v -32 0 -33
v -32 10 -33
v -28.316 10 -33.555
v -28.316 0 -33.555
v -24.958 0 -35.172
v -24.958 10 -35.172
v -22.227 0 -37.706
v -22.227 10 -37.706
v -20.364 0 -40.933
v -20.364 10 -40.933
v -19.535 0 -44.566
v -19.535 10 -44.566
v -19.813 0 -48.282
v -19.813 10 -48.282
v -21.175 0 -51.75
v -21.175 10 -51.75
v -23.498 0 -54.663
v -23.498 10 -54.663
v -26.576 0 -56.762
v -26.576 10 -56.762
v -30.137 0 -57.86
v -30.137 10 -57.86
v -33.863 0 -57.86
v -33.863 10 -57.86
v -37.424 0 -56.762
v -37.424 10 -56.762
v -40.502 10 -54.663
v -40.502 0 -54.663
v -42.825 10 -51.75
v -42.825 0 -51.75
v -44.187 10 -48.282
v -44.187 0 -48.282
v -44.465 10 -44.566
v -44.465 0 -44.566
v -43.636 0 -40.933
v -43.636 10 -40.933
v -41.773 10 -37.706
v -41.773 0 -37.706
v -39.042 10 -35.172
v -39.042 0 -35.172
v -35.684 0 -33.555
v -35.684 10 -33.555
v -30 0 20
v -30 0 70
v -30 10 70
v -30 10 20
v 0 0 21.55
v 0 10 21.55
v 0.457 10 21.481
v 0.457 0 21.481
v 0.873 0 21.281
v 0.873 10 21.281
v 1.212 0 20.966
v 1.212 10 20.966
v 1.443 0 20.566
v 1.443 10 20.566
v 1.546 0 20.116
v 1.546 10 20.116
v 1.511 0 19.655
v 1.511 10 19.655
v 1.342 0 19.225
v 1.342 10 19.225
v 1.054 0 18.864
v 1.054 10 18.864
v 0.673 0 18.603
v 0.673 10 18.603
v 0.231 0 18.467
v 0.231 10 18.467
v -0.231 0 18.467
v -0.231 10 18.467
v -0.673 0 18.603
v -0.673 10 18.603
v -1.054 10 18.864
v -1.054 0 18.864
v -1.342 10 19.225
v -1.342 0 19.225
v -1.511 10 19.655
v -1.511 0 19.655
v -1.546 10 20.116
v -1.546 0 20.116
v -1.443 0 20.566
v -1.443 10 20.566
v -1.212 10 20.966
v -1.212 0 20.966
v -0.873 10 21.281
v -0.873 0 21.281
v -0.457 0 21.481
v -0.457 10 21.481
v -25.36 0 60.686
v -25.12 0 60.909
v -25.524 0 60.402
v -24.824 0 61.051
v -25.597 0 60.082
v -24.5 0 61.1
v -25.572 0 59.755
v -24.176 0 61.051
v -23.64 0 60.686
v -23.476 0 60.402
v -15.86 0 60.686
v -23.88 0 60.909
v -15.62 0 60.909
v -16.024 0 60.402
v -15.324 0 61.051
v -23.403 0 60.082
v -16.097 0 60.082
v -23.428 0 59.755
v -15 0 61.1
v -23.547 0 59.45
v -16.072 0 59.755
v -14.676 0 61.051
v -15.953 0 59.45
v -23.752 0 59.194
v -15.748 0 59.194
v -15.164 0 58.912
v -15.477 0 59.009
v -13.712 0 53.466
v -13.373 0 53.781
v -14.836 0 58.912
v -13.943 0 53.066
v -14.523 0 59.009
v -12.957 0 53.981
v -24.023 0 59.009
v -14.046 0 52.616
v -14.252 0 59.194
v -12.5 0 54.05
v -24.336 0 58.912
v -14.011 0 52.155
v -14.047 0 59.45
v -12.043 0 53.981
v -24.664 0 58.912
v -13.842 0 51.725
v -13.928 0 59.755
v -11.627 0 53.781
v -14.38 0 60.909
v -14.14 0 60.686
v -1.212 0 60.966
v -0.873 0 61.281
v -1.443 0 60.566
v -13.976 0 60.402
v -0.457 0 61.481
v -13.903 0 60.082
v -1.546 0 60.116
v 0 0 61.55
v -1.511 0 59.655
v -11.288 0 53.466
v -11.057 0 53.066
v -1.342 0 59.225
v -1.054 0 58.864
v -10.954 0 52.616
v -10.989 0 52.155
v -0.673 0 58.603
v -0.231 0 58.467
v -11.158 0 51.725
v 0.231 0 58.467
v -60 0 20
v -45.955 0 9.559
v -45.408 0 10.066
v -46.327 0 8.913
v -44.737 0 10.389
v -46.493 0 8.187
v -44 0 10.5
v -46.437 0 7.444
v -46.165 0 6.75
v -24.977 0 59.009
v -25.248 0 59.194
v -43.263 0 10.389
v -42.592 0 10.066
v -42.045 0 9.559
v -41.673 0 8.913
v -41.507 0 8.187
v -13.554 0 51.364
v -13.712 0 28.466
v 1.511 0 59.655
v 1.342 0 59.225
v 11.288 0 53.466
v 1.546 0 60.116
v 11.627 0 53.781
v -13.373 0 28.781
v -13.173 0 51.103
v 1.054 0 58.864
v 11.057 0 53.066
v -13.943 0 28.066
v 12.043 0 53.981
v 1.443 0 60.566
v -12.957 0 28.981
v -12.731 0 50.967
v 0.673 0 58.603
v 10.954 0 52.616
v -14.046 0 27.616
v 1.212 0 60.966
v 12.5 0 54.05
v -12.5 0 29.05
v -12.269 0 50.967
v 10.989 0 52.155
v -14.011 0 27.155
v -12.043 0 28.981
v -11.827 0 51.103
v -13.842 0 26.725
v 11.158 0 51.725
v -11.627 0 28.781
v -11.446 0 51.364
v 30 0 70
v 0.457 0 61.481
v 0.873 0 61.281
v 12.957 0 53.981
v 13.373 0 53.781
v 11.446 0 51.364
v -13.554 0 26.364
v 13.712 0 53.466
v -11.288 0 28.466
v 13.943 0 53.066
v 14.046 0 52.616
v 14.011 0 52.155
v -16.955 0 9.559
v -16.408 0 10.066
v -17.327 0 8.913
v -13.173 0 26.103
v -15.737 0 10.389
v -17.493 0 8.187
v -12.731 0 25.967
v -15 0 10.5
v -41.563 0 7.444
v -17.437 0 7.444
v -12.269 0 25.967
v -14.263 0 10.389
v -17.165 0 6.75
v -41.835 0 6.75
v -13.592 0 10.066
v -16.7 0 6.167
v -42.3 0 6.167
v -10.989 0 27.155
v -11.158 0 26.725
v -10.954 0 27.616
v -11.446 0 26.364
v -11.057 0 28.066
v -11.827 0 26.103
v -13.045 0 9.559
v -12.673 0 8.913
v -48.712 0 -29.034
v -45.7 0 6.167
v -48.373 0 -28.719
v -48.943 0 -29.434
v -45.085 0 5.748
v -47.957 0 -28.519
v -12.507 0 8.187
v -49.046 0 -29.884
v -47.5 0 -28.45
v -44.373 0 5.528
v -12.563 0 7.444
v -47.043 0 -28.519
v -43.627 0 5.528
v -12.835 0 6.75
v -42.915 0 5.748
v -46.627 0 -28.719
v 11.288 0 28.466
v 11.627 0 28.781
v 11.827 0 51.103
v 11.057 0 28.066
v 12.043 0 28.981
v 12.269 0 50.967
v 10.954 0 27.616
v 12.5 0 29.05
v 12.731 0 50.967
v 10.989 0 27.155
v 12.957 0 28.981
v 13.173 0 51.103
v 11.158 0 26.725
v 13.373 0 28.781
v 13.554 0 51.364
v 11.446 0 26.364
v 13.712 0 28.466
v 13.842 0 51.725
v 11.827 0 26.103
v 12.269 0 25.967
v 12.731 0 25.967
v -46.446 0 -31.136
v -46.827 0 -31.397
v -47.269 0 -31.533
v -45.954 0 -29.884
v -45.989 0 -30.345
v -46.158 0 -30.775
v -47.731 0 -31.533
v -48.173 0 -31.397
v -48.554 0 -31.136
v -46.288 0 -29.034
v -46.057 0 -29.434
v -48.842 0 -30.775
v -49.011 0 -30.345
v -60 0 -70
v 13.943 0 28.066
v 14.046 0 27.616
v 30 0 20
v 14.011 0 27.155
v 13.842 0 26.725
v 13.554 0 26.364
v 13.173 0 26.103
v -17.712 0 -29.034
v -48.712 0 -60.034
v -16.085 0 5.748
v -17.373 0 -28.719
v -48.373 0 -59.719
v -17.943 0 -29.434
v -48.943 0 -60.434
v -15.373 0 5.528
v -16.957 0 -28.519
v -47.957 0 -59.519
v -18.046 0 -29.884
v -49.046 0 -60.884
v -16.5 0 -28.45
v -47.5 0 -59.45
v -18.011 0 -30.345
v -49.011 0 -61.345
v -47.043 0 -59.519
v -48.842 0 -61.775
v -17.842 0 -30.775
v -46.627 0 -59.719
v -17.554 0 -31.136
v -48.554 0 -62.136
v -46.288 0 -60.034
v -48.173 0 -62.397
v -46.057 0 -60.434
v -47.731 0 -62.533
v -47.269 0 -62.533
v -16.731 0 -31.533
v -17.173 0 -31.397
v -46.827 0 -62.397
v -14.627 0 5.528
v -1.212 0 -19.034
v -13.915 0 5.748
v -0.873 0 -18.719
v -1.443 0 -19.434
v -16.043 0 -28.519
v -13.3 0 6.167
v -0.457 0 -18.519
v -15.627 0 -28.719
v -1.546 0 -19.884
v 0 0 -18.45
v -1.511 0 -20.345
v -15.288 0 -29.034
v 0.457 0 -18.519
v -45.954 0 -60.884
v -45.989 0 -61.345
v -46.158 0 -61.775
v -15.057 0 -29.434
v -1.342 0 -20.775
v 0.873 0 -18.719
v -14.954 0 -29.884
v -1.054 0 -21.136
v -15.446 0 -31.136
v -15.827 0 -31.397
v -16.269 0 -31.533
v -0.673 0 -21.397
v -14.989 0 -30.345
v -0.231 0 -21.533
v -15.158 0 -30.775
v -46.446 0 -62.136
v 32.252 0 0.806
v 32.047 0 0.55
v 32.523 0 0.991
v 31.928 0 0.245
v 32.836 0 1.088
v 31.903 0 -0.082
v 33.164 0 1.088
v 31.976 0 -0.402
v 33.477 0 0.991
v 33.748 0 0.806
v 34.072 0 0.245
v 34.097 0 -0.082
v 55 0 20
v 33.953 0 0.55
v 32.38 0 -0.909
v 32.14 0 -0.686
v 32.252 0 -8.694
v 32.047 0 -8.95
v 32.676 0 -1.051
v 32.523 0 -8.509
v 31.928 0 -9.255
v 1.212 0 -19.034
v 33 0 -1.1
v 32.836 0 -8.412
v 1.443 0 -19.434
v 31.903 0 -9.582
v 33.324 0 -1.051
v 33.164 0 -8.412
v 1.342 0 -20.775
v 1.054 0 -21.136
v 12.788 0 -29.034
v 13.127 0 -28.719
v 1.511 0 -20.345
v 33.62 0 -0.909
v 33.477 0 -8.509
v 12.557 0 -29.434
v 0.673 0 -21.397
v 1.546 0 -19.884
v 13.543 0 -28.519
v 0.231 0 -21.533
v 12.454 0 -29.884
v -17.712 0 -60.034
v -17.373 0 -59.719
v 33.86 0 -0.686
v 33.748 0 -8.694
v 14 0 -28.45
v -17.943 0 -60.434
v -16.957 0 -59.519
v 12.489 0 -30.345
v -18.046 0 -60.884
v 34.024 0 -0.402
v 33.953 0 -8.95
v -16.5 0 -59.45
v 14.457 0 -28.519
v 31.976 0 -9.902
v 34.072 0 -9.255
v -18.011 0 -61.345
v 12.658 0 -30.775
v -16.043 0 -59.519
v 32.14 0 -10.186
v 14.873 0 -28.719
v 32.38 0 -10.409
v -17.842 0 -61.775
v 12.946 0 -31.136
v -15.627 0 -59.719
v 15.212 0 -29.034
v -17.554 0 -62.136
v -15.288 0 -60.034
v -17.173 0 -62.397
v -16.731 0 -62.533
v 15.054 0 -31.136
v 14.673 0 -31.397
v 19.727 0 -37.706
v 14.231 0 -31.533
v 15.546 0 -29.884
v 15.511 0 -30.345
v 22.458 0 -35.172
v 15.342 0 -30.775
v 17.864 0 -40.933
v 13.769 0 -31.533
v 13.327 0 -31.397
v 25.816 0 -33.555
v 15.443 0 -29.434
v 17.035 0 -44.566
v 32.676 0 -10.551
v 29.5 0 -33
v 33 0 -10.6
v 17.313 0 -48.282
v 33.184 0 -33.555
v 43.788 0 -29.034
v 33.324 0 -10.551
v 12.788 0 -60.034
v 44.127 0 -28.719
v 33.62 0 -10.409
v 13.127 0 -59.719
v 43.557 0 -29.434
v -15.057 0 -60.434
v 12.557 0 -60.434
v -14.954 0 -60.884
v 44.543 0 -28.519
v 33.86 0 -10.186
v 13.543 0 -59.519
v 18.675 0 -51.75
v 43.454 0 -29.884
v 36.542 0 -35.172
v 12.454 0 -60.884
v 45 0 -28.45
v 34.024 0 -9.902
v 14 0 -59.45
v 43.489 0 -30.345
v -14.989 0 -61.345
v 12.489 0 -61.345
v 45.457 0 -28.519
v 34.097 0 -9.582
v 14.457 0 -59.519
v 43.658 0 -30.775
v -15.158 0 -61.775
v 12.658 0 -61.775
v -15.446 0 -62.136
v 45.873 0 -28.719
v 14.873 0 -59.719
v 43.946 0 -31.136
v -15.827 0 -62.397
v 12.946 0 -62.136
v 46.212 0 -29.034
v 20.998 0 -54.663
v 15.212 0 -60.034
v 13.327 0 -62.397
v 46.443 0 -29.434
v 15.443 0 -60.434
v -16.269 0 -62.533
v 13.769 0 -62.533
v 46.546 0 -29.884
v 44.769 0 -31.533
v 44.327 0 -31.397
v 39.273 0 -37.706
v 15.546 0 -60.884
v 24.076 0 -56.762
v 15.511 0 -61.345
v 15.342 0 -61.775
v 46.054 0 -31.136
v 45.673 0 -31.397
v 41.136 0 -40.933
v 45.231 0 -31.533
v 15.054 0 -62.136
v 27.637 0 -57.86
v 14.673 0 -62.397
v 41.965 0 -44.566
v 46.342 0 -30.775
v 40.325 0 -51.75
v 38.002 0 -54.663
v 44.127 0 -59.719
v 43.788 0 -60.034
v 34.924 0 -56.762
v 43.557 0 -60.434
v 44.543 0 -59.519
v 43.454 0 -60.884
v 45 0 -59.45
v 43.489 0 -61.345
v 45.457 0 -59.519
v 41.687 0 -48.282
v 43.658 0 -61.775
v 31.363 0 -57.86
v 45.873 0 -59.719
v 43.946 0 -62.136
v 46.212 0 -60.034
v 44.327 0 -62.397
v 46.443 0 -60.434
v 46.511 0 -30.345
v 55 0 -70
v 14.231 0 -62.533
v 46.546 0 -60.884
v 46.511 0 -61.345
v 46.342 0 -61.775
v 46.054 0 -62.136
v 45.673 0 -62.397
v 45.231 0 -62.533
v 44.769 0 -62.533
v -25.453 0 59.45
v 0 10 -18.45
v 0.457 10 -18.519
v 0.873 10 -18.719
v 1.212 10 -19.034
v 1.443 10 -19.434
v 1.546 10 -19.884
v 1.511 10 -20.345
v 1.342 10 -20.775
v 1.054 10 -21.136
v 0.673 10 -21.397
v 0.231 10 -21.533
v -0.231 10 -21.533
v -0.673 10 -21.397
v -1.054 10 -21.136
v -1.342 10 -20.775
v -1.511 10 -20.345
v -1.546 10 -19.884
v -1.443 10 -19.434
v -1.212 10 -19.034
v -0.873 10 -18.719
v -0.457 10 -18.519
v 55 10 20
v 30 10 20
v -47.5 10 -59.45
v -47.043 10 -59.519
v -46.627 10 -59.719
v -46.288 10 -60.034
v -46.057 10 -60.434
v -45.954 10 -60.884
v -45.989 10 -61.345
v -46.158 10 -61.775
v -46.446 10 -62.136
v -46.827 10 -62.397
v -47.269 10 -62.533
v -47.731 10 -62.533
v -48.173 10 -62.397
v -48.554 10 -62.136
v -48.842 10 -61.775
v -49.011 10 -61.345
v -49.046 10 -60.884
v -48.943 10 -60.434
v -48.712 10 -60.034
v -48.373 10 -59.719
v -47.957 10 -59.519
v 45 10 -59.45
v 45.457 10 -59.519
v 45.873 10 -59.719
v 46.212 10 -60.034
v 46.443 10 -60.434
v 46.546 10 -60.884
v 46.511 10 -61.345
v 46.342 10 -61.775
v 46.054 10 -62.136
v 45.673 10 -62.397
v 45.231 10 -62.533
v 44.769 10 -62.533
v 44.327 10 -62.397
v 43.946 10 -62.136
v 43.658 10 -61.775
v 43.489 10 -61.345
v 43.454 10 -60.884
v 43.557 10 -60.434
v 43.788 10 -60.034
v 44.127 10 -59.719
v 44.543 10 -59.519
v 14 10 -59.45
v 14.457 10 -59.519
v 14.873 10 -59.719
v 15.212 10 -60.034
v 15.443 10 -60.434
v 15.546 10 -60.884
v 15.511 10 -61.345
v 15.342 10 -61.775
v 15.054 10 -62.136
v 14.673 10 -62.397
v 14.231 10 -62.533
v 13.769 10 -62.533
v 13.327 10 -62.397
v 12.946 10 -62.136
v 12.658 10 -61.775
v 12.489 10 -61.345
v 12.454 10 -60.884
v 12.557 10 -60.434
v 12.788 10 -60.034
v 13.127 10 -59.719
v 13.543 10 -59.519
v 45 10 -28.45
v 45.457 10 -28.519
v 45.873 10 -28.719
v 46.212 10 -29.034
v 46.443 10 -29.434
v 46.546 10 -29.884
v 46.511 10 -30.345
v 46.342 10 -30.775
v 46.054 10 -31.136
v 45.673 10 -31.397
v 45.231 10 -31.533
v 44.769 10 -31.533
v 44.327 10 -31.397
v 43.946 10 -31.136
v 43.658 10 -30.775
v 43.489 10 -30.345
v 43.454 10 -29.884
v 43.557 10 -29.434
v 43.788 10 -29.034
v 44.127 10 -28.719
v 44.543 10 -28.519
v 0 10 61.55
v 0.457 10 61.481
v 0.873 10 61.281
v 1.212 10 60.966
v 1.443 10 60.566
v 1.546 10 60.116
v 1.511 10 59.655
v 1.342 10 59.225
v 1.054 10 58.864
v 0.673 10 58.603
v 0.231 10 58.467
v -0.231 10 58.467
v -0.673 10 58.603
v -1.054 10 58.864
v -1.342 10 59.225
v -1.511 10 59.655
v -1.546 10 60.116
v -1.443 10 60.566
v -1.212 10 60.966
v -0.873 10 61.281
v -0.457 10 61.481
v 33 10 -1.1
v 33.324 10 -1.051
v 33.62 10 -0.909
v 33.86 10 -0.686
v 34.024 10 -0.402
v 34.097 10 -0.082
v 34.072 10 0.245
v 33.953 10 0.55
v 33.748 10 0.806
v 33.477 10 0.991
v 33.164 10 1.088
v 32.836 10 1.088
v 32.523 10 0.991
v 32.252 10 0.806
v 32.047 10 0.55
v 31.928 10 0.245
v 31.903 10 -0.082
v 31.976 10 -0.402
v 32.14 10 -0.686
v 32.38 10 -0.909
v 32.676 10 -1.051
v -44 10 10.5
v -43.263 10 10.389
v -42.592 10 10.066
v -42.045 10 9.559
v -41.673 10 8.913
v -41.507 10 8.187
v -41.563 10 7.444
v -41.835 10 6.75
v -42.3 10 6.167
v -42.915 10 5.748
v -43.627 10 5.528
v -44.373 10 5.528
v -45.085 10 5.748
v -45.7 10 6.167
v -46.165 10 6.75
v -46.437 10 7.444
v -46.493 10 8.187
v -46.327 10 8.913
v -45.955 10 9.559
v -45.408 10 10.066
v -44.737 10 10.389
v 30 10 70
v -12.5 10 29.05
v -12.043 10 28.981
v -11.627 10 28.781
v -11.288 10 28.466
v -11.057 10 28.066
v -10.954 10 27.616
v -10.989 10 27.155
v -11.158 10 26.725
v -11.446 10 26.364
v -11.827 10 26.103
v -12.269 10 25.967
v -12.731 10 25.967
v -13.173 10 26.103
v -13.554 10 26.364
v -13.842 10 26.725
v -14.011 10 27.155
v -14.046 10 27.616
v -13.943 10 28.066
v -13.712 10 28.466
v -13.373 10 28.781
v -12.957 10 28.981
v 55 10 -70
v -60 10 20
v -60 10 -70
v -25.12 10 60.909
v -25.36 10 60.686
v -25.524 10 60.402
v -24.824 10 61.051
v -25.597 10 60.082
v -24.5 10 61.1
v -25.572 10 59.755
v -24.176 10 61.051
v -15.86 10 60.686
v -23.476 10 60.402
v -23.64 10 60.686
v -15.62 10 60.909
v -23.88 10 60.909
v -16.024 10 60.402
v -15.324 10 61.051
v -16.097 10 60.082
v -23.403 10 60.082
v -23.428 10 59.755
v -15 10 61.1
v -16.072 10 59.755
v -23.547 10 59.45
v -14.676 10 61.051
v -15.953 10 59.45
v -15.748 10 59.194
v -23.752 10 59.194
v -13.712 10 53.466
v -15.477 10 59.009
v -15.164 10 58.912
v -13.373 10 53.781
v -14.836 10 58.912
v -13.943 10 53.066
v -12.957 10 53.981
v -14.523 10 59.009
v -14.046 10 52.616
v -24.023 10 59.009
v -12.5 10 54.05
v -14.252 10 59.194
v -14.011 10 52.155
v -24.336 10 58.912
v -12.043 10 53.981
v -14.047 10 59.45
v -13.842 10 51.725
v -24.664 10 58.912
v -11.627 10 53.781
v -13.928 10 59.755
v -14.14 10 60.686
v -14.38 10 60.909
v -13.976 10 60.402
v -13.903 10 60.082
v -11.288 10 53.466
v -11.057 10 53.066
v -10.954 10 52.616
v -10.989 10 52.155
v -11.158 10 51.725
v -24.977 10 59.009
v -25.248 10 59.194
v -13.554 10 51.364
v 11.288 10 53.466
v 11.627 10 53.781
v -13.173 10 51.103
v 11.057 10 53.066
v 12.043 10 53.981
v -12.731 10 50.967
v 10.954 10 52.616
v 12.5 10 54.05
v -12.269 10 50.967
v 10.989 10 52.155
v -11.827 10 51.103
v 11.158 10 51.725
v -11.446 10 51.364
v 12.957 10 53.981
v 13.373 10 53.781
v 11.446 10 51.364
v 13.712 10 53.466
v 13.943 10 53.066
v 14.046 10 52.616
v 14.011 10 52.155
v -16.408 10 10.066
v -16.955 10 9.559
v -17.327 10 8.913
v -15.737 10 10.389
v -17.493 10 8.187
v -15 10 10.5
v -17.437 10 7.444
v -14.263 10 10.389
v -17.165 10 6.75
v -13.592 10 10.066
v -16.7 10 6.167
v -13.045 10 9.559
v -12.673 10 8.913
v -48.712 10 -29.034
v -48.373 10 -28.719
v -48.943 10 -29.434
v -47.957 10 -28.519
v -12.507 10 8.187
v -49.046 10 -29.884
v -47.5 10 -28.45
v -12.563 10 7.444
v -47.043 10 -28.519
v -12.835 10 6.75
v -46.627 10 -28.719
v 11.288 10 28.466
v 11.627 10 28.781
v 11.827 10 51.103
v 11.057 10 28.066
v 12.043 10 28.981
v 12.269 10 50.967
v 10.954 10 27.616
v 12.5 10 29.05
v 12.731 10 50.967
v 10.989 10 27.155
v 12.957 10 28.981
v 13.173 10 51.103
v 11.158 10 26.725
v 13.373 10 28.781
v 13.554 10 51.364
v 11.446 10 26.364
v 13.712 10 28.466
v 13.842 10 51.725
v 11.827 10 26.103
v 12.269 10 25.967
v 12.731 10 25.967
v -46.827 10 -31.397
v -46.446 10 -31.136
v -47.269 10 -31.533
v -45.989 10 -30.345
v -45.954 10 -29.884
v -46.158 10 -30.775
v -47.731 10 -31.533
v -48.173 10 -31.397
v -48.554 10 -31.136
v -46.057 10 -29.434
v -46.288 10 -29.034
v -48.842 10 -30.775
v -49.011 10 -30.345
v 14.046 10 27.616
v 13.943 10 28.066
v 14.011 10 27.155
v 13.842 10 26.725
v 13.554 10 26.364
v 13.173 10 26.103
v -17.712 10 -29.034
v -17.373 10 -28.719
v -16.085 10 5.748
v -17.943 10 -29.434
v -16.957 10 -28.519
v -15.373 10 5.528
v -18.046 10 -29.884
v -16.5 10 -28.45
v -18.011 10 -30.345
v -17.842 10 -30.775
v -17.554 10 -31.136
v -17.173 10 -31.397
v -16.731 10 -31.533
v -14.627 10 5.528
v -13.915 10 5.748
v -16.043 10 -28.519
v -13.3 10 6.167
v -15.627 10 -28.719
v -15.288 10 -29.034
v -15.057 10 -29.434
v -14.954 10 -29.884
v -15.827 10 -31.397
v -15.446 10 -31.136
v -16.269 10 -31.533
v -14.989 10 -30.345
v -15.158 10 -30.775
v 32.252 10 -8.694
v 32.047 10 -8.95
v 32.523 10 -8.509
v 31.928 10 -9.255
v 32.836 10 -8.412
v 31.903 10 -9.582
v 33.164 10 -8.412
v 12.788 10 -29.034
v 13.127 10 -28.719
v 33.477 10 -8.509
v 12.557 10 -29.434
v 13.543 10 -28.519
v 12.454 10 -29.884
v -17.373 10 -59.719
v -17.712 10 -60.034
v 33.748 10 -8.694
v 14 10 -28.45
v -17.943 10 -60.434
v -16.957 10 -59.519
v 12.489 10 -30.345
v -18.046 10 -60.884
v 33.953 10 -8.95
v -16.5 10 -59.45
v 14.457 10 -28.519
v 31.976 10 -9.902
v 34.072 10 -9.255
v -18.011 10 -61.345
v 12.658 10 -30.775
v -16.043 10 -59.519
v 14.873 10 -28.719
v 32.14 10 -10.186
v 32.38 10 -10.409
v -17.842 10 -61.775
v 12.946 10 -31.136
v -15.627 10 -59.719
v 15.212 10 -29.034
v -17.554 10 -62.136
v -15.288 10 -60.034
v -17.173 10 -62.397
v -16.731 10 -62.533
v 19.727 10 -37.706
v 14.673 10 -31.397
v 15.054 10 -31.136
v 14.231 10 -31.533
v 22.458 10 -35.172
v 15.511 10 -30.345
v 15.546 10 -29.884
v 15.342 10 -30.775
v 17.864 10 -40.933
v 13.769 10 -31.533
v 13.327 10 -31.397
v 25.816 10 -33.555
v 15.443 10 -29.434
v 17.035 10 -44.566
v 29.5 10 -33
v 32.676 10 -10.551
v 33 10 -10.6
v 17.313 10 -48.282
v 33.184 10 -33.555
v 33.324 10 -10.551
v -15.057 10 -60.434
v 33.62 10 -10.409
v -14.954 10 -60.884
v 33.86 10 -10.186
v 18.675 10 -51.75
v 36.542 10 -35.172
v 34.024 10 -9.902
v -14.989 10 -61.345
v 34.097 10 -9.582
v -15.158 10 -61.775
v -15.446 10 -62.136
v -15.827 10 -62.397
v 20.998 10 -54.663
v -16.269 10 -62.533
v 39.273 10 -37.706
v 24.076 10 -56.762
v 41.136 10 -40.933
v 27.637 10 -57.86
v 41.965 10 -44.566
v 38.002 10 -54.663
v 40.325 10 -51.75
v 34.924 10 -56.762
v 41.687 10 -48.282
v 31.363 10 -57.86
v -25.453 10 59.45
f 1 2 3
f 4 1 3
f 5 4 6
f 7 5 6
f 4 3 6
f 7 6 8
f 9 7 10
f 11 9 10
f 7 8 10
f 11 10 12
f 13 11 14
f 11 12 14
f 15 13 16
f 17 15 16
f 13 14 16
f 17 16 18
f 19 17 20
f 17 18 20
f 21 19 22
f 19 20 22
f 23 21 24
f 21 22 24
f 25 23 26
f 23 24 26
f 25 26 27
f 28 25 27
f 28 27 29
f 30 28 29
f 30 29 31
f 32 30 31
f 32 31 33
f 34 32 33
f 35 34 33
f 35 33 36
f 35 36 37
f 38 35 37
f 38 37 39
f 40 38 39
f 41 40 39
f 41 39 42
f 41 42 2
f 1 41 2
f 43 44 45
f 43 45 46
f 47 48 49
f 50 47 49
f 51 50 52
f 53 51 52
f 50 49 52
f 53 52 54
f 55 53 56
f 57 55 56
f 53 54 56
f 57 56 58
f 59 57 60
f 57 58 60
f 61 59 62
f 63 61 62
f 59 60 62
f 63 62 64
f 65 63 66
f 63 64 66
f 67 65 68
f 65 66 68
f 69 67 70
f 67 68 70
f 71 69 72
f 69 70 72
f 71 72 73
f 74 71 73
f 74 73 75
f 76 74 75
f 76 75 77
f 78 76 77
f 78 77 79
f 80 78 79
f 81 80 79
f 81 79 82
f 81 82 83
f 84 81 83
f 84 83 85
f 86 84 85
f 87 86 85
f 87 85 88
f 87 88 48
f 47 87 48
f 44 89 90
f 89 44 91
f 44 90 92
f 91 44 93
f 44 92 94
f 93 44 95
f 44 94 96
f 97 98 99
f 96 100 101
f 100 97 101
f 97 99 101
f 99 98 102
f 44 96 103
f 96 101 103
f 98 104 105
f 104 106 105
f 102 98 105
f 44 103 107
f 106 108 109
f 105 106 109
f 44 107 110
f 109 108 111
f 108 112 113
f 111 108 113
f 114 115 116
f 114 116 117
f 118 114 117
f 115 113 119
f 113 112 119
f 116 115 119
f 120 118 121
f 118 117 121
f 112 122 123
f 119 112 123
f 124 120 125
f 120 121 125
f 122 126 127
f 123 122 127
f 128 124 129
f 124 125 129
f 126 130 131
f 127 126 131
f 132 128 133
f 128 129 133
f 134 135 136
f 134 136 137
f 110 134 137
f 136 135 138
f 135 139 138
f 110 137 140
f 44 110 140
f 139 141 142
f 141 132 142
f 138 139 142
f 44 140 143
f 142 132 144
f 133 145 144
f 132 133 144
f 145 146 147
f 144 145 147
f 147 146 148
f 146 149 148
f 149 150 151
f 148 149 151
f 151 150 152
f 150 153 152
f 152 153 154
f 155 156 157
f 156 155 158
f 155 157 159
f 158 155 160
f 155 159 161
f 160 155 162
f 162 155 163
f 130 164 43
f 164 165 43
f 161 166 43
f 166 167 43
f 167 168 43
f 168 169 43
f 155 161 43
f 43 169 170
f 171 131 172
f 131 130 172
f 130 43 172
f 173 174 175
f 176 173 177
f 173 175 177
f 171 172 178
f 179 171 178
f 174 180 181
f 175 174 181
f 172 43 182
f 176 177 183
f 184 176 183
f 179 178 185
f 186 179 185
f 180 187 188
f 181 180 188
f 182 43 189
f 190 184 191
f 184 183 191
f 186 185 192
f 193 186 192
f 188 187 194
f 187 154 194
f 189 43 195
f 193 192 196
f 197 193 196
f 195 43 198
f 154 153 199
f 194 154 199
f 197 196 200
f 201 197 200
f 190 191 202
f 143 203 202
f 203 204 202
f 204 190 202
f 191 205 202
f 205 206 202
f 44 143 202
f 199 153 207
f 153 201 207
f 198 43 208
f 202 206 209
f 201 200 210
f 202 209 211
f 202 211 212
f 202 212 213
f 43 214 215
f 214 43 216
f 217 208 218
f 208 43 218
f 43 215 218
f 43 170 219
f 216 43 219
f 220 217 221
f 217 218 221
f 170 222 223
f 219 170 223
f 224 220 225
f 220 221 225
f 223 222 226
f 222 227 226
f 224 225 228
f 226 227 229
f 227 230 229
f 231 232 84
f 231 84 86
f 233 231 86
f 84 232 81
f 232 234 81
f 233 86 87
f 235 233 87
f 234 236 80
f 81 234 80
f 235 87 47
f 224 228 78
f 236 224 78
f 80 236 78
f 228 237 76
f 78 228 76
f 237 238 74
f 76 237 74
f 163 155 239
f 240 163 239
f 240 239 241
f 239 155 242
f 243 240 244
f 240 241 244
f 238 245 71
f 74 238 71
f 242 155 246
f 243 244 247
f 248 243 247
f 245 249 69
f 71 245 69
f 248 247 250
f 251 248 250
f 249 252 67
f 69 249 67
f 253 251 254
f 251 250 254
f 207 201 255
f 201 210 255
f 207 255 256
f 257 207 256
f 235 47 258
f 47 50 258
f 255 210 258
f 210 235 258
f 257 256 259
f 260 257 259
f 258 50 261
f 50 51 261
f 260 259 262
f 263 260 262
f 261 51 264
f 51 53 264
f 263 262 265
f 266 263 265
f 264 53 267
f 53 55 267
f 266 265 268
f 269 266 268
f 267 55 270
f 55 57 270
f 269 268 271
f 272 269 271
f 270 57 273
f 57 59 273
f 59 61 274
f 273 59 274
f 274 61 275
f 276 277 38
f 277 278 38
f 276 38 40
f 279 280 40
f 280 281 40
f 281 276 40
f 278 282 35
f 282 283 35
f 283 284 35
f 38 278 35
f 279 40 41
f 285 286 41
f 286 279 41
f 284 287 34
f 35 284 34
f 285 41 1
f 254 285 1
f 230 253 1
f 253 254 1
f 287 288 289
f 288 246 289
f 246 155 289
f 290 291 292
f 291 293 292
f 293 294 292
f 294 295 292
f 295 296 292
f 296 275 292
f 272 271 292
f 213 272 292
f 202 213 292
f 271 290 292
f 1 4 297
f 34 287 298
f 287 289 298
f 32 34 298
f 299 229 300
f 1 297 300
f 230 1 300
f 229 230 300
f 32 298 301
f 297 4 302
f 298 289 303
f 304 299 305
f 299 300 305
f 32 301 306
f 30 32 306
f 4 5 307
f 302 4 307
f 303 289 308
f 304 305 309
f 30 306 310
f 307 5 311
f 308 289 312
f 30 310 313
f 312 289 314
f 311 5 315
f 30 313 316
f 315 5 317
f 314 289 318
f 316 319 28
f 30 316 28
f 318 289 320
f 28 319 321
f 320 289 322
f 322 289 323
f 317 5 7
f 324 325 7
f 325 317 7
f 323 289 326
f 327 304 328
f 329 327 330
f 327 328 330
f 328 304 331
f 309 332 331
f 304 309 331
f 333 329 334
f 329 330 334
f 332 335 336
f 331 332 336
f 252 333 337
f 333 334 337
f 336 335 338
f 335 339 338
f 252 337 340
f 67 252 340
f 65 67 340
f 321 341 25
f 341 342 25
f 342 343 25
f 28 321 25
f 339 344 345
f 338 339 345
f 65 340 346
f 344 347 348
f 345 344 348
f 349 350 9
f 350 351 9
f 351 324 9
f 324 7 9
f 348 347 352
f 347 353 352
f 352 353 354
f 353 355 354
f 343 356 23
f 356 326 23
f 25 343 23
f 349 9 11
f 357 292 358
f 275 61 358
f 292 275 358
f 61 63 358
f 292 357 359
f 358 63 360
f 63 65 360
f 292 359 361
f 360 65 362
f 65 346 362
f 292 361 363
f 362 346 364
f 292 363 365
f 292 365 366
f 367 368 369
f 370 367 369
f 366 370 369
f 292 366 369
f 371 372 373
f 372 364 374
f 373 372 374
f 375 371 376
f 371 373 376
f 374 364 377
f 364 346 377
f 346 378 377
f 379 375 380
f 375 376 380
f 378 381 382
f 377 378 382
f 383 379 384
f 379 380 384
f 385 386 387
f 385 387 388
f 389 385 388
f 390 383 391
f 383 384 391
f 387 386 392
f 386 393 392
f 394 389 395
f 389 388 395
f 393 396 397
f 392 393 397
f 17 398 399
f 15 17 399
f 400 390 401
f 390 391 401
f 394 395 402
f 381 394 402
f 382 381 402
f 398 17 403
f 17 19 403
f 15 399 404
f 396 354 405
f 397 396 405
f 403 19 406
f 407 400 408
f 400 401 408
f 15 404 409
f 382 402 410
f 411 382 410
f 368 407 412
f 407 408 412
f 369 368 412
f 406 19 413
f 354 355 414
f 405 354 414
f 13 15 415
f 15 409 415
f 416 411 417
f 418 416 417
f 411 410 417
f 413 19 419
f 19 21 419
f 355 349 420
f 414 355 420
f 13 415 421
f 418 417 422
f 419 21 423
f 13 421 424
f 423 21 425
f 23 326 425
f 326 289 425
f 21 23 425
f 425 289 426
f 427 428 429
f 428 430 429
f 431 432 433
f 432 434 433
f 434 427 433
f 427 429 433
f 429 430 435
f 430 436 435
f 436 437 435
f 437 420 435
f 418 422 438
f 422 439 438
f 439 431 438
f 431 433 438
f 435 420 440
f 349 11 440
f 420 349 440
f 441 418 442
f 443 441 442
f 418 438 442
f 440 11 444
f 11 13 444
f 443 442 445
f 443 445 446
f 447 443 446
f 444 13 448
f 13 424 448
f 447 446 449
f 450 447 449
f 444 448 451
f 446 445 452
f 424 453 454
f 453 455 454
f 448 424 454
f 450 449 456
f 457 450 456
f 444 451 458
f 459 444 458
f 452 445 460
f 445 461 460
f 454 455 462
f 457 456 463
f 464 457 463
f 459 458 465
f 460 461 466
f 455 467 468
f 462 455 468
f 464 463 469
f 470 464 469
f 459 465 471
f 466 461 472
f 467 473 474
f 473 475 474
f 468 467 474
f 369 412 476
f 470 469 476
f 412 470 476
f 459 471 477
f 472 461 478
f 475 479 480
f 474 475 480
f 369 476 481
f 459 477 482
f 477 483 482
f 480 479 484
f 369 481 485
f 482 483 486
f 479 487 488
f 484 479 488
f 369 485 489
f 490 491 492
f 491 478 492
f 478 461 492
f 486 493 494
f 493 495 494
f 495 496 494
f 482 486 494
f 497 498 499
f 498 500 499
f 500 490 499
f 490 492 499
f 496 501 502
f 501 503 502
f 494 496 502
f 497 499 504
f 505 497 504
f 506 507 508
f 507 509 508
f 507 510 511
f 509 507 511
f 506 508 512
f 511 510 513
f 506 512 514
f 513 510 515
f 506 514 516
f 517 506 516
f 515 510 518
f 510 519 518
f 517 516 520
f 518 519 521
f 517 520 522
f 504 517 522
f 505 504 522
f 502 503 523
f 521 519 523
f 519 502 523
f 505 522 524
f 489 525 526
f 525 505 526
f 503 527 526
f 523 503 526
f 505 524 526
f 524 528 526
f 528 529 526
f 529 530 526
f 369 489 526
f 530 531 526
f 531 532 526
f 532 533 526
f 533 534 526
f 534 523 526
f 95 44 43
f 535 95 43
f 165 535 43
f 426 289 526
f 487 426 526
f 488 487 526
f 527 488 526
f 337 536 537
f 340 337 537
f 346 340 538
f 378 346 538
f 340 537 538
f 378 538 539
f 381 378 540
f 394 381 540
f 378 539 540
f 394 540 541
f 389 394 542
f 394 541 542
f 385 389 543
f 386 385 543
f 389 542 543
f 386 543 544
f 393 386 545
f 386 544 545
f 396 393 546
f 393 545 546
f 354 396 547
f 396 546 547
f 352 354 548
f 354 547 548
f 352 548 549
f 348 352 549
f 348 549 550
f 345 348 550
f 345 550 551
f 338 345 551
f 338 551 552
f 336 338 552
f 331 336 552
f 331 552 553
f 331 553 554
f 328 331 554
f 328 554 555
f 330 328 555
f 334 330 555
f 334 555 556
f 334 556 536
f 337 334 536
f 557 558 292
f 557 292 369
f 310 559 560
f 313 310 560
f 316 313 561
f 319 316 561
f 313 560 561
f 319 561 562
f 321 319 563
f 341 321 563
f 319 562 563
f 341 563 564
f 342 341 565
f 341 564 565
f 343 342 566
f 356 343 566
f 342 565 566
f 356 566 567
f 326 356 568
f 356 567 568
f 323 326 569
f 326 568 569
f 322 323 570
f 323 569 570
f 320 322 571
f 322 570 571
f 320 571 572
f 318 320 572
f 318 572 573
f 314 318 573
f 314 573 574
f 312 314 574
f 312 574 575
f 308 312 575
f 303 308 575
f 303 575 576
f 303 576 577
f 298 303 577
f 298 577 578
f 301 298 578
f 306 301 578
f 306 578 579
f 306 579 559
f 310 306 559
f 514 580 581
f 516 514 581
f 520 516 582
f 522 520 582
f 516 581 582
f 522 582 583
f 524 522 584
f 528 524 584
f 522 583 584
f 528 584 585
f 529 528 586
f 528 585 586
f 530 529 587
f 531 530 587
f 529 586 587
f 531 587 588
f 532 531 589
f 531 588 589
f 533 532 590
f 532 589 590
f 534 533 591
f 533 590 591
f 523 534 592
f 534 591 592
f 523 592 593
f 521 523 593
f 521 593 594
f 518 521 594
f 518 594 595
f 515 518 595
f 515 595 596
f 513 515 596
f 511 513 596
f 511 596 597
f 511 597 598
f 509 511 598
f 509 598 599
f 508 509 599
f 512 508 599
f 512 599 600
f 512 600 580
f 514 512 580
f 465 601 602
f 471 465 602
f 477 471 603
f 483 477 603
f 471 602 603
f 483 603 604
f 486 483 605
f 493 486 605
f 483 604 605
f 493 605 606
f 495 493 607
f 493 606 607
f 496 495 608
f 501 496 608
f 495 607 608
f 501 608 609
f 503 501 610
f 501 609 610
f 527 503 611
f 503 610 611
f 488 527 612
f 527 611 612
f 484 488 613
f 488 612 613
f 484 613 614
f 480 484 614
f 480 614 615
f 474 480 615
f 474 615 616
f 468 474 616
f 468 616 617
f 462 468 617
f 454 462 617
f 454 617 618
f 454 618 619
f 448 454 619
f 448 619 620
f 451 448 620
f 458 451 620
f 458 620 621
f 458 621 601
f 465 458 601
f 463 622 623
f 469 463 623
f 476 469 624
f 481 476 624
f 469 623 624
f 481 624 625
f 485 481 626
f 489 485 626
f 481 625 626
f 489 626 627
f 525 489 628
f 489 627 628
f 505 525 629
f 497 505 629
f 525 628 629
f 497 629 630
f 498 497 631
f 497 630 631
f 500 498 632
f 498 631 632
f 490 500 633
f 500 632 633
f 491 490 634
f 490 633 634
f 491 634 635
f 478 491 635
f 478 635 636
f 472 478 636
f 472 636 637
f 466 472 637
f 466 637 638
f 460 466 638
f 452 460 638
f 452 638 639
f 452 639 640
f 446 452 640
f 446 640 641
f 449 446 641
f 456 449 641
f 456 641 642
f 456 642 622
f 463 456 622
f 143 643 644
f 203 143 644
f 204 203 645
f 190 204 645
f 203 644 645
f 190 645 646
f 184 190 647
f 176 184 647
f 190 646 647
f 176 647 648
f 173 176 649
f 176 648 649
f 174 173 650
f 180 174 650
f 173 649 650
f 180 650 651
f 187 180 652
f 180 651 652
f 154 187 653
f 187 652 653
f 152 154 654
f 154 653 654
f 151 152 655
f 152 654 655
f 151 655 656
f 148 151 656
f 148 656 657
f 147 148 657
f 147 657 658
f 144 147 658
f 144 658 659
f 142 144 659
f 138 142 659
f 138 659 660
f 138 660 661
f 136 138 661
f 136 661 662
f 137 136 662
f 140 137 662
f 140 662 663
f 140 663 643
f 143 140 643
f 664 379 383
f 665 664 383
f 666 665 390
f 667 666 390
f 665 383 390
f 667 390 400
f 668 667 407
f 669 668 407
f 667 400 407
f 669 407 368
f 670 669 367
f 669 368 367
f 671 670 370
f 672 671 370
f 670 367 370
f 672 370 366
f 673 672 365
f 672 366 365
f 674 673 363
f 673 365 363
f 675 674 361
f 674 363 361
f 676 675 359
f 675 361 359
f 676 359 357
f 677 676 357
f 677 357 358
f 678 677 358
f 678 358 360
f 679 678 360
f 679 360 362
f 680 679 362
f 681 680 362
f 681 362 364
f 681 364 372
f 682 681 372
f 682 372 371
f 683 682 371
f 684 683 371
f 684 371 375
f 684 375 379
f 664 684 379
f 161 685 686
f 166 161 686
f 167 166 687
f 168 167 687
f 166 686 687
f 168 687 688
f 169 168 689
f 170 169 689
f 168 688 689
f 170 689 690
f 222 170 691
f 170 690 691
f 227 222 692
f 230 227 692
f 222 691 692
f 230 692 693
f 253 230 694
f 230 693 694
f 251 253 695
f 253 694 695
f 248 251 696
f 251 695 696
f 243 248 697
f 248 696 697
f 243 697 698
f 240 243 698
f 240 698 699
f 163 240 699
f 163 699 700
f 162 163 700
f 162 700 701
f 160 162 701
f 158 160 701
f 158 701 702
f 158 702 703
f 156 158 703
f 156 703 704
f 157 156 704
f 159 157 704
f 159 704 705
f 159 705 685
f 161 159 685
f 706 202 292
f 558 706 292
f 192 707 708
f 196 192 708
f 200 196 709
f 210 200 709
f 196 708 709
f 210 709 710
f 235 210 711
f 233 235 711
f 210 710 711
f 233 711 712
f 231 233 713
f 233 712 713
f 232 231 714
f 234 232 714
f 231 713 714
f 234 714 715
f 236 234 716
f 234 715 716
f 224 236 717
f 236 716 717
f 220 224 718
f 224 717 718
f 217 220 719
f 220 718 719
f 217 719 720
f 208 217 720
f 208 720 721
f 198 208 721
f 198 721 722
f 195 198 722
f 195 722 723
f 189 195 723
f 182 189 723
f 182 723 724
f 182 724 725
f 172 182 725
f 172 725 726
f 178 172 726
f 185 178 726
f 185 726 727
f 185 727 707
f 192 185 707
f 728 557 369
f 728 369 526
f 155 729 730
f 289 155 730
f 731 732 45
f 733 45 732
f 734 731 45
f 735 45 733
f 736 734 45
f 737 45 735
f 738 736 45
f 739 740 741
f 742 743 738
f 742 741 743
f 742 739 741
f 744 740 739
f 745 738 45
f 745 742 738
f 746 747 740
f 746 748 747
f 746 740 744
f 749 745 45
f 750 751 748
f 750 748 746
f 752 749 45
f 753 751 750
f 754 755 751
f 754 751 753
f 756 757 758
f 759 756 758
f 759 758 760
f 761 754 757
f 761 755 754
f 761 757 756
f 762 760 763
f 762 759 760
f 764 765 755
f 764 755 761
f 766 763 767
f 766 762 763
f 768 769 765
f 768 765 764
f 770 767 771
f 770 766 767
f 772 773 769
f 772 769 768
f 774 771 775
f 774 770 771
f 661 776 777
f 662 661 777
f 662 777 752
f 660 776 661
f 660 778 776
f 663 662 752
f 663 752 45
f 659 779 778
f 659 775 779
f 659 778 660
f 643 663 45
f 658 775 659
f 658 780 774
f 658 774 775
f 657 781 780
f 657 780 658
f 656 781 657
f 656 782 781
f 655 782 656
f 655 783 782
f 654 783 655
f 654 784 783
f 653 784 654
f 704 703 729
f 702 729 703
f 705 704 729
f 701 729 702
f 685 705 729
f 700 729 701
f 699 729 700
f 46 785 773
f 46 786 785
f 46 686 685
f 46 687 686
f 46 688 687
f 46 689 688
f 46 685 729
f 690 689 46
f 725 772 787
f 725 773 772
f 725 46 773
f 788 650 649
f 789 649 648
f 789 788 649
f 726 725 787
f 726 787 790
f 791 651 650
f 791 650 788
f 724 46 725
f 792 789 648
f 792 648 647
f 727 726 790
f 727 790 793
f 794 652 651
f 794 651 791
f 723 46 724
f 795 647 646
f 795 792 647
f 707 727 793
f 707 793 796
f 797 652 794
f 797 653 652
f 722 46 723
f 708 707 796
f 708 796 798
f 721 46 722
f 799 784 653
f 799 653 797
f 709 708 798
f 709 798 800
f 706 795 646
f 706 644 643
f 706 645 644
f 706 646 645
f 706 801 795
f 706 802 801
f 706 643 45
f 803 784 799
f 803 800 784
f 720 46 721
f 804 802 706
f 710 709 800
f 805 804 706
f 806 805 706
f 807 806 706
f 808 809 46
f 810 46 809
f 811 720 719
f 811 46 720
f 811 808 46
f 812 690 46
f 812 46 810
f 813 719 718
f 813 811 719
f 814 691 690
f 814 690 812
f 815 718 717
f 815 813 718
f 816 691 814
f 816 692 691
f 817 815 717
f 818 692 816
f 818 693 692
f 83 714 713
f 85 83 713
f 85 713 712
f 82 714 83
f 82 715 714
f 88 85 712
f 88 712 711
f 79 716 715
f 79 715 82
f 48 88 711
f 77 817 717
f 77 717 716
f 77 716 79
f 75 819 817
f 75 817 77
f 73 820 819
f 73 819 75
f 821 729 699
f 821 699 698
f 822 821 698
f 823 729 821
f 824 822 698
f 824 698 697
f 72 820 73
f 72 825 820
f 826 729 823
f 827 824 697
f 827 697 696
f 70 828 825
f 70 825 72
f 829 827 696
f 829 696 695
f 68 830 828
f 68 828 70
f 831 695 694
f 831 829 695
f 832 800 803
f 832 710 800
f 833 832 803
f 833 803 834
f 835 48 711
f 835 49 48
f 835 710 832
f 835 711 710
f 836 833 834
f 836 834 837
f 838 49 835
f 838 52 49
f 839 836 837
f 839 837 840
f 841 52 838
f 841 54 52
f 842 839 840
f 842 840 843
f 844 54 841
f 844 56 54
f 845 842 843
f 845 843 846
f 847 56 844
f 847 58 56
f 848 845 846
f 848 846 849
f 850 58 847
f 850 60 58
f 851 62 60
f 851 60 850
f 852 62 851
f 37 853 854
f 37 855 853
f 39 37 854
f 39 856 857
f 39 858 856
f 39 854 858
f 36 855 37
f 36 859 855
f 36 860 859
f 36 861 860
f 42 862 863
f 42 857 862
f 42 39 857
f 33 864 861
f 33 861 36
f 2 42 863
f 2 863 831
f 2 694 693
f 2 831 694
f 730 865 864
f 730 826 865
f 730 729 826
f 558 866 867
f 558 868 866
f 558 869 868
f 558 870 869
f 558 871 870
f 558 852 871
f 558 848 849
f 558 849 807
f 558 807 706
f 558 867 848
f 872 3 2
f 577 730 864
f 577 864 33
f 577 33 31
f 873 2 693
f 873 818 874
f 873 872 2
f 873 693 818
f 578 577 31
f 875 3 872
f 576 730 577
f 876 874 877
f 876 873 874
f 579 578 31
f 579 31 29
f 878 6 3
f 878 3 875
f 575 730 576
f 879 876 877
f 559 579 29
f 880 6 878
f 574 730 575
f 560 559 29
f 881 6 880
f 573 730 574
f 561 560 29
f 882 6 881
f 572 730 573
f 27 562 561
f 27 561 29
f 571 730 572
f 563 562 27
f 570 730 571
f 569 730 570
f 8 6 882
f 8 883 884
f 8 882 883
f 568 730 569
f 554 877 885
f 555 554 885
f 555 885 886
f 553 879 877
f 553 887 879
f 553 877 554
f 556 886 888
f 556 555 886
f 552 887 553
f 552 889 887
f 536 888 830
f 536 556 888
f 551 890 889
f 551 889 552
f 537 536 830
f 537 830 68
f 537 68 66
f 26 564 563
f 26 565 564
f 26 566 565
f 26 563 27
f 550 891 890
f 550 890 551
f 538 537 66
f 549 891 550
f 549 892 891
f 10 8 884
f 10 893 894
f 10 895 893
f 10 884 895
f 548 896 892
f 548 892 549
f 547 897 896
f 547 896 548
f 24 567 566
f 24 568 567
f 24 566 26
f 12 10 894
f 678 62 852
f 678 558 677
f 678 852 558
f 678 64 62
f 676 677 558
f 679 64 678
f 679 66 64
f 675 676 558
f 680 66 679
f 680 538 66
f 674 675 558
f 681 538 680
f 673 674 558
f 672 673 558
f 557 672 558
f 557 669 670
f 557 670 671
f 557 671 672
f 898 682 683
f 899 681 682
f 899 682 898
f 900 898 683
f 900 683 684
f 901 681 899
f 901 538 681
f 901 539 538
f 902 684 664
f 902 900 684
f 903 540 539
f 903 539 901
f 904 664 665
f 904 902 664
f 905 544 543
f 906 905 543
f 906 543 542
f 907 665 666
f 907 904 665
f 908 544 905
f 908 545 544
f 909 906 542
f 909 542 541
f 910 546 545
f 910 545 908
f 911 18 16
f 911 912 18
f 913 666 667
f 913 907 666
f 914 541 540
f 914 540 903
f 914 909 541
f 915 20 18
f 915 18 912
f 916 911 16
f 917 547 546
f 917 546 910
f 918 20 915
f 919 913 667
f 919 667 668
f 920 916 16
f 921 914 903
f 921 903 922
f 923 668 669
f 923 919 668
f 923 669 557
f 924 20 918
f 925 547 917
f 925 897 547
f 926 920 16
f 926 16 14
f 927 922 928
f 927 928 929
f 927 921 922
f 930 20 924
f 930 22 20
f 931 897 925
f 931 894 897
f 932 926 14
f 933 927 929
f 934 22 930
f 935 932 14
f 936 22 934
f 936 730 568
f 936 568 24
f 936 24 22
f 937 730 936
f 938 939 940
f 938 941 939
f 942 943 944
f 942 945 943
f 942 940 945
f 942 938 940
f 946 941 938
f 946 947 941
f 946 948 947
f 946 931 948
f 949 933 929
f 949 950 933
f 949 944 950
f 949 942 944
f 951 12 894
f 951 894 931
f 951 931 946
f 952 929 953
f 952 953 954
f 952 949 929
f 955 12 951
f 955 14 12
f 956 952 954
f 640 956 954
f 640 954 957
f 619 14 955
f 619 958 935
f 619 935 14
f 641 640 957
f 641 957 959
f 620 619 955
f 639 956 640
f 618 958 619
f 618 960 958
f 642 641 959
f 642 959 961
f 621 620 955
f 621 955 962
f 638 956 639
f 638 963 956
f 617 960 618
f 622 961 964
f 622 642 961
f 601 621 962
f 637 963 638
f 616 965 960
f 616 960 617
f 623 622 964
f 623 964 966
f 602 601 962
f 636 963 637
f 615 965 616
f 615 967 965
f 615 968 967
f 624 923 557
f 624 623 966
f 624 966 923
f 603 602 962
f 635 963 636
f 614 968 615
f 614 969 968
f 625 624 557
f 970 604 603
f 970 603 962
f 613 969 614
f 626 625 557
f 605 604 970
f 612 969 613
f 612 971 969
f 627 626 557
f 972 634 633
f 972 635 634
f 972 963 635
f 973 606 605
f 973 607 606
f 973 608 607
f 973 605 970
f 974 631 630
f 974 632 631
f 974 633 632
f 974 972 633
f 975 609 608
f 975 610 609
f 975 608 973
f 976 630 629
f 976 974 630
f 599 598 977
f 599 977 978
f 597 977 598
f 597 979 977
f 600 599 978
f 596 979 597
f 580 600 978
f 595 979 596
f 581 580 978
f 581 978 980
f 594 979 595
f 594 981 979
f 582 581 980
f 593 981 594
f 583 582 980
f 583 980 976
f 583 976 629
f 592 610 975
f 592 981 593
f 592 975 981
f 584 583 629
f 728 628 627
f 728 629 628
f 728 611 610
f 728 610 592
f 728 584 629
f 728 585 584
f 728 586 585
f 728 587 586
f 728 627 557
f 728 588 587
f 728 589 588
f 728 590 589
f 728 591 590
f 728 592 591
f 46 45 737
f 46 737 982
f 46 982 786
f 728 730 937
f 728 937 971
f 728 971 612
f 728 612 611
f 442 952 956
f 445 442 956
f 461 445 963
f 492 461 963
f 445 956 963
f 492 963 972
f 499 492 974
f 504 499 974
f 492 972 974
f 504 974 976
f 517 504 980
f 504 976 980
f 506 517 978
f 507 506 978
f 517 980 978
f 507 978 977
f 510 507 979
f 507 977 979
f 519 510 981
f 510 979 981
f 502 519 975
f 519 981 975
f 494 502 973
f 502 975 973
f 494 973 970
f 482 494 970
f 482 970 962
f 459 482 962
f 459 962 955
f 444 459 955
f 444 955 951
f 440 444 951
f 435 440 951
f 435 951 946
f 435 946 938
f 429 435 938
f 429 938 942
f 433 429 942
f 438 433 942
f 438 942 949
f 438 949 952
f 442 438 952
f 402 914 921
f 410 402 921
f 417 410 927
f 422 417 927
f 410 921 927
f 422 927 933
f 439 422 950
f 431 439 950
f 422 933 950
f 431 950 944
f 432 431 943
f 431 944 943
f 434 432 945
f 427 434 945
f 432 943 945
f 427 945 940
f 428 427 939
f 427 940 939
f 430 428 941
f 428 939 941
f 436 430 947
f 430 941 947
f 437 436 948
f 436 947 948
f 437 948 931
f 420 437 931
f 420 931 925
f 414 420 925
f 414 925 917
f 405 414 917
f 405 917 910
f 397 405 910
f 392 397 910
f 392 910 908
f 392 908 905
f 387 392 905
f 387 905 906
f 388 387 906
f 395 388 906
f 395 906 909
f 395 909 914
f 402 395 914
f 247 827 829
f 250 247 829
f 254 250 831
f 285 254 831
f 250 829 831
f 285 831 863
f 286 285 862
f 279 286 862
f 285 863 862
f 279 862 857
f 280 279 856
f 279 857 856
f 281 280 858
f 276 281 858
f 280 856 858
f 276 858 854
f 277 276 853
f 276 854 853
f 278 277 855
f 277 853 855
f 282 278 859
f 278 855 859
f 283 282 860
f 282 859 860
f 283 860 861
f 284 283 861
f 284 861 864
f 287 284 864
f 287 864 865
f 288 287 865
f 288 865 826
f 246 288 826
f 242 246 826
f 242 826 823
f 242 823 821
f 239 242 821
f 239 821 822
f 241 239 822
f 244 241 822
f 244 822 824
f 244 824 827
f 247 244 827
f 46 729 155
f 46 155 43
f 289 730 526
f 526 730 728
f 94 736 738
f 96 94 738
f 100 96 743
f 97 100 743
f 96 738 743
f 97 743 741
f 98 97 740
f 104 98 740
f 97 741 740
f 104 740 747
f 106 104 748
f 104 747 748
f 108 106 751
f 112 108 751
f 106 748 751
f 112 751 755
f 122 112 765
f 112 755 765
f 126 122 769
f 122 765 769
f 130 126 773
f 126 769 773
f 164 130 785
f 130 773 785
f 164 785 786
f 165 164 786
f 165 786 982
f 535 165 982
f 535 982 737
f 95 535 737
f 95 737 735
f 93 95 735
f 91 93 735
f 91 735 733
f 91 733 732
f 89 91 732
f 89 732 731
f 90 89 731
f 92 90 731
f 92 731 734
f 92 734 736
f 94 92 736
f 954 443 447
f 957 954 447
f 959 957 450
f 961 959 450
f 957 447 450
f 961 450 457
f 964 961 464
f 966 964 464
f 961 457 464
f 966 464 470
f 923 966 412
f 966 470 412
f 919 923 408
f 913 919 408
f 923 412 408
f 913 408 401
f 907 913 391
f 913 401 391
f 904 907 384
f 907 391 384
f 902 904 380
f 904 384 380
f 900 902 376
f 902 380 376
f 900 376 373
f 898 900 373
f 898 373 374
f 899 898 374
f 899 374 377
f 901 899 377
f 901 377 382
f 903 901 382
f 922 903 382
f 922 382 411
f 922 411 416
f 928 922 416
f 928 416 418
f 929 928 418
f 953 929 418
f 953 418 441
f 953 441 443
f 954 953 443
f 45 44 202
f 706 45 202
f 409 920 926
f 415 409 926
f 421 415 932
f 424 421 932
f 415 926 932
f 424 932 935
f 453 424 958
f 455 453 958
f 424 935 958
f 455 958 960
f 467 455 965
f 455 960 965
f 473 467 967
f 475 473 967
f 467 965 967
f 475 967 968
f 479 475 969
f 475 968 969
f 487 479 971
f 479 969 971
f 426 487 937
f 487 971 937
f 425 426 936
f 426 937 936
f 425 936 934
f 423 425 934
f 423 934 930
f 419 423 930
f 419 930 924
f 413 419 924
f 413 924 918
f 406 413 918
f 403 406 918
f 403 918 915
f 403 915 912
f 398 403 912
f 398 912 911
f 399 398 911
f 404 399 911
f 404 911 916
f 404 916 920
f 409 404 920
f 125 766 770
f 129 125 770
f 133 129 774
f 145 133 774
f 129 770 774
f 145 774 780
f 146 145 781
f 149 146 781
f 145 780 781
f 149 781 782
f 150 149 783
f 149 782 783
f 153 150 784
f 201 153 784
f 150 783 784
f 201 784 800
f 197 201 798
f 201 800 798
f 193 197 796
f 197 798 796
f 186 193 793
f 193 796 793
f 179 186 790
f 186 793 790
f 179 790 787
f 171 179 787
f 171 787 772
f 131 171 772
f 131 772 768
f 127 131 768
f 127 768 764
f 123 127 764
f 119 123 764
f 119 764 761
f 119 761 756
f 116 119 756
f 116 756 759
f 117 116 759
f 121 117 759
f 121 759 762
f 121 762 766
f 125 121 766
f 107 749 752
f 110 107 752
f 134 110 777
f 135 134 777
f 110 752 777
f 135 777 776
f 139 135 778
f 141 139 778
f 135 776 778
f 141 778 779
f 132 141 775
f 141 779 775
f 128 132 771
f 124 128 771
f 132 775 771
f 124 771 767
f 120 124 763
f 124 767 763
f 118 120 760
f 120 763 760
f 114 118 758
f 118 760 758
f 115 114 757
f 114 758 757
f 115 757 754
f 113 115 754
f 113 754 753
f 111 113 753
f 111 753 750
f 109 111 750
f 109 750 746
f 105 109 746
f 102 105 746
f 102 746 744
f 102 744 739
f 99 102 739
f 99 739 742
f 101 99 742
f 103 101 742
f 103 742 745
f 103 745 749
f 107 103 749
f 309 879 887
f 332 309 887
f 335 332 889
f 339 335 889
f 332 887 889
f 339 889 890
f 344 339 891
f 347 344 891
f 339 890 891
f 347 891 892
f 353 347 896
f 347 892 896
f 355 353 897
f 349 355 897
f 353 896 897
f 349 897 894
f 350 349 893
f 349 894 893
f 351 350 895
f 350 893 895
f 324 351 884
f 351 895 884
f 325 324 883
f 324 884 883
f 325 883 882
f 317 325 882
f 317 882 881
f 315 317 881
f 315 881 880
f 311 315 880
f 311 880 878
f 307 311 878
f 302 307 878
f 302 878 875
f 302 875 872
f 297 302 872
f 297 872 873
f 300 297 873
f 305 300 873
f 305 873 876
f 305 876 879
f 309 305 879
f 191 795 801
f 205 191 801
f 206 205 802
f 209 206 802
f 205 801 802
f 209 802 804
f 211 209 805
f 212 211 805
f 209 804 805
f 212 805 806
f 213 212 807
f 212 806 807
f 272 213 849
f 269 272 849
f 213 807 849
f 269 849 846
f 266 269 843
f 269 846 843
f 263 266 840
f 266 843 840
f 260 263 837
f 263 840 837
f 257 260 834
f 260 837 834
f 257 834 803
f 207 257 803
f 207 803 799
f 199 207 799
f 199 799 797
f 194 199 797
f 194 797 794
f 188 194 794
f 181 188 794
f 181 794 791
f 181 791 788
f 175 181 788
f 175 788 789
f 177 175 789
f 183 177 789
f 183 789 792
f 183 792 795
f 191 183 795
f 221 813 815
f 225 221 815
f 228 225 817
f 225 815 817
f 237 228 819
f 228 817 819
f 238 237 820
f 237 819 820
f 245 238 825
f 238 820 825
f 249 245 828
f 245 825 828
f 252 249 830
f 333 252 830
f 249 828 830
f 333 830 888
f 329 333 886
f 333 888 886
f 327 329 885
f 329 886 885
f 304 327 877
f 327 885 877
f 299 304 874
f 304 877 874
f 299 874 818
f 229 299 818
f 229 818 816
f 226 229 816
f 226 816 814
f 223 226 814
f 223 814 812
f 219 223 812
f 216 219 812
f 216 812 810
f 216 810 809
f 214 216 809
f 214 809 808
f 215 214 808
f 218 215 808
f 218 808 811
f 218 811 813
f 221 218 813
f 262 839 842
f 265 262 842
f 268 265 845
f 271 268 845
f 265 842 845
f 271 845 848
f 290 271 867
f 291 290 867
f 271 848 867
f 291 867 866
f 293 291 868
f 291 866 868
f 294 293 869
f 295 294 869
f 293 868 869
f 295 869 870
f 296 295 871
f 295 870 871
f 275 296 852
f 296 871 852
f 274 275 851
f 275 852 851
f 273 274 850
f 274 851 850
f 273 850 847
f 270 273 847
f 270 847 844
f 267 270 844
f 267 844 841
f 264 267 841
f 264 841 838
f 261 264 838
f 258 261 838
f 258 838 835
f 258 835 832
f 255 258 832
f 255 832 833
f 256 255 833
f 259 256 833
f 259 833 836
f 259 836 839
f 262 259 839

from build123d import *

# Parameters (mm, degrees)
SKETCH1_W           = 60
SKETCH1_H           = 140
BOSS_EXTRUDE1_DEPTH = 10
SKETCH3_R           = 1.55
CUT_EXTRUDE1_DEPTH  = 77.811457479
SKETCH4_R           = 1.55
CUT_EXTRUDE2_DEPTH  = 77.811457479
SKETCH7_W           = 25
SKETCH7_H           = 90
BOSS_EXTRUDE2_DEPTH = 10
SKETCH8_R           = 1.55
SKETCH8_R_2         = 12.5
CUT_EXTRUDE4_DEPTH  = 90.582364336
SKETCH9_W           = 30
SKETCH9_H           = 90
BOSS_EXTRUDE3_DEPTH = 10
SKETCH10_R          = 1.55
SKETCH10_R_2        = 12.5
CUT_EXTRUDE5_DEPTH  = 93.736184955
SKETCH11_R          = 2.5
CUT_EXTRUDE6_DEPTH  = 93.736184955
SKETCH12_R          = 1.1
CUT_EXTRUDE7_DEPTH  = 93.736184955
CUT_EXTRUDE8_REACH  = 94.736
SKETCH13_R          = 1.1


with BuildPart() as part:
    # Sketch1 → Boss-Extrude1 (new body)
    with BuildSketch(Plane(origin=(0, 0, 0), x_dir=(1, 0, 0), z_dir=(0, 1, 0))):
        Rectangle(SKETCH1_W, SKETCH1_H)
    extrude(amount=BOSS_EXTRUDE1_DEPTH)

    # Sketch3 → Cut-Extrude1 (cut, through all)
    with BuildSketch(Plane(origin=(0, 10, 0), x_dir=(1, 0, 0), z_dir=(0, 1, 0))):
        with Locations(Location((0, -60, 0), (0, 0, 270))):
            Circle(SKETCH3_R)
        with Locations(Location((0, -20, 0), (0, 0, 270))):
            Circle(SKETCH3_R)
        with Locations(Location((0, 20, 0), (0, 0, 270))):
            Circle(SKETCH3_R)
    extrude(amount=-CUT_EXTRUDE1_DEPTH, mode=Mode.SUBTRACT)

    # Sketch4 → Cut-Extrude2 (cut, through all)
    with BuildSketch(Plane(origin=(0, 10, 0), x_dir=(1, 0, 0), z_dir=(0, 1, 0))):
        with Locations(Location((12.5, -27.5, 0), (0, 0, 270))):
            Circle(SKETCH4_R)
        with Locations(Location((12.5, -52.5, 0), (0, 0, 270))):
            Circle(SKETCH4_R)
        with Locations(Location((-12.5, -27.5, 0), (0, 0, 270))):
            Circle(SKETCH4_R)
        with Locations(Location((-12.5, -52.5, 0), (0, 0, 270))):
            Circle(SKETCH4_R)
    extrude(amount=-CUT_EXTRUDE2_DEPTH, mode=Mode.SUBTRACT)

    # Sketch7 → Boss-Extrude2 (add)
    with BuildSketch(Plane(origin=(0, 10, 0), x_dir=(1, 0, 0), z_dir=(0, 1, 0))):
        with Locations((42.5, 25)):
            Rectangle(SKETCH7_W, SKETCH7_H)
    extrude(amount=-BOSS_EXTRUDE2_DEPTH)

    # Sketch8 → Cut-Extrude4 (cut, through all)
    with BuildSketch(Plane(origin=(0, 10, 0), x_dir=(1, 0, 0), z_dir=(0, 1, 0))):
        with Locations(Location((14, 30, 0), (0, 0, 270))):
            Circle(SKETCH8_R)
        with Locations(Location((45, 30, 0), (0, 0, 270))):
            Circle(SKETCH8_R)
        with Locations(Location((45, 61, 0), (0, 0, 270))):
            Circle(SKETCH8_R)
        with Locations(Location((14, 61, 0), (0, 0, 270))):
            Circle(SKETCH8_R)
        with Locations(Location((29.5, 45.5, 0), (0, 0, 270))):
            Circle(SKETCH8_R_2)
    extrude(amount=-CUT_EXTRUDE4_DEPTH, mode=Mode.SUBTRACT)

    # Sketch9 → Boss-Extrude3 (add)
    with BuildSketch(Plane(origin=(0, 10, 0), x_dir=(1, 0, 0), z_dir=(0, 1, 0))):
        with Locations((-45, 25)):
            Rectangle(SKETCH9_W, SKETCH9_H)
    extrude(amount=-BOSS_EXTRUDE3_DEPTH)

    # Sketch10 → Cut-Extrude5 (cut, through all)
    with BuildSketch(Plane(origin=(0, 10, 0), x_dir=(1, 0, 0), z_dir=(0, 1, 0))):
        with Locations(Location((-47.5, 61, 0), (0, 0, 270))):
            Circle(SKETCH10_R)
        with Locations(Location((-16.5, 61, 0), (0, 0, 270))):
            Circle(SKETCH10_R)
        with Locations(Location((-16.5, 30, 0), (0, 0, 270))):
            Circle(SKETCH10_R)
        with Locations(Location((-47.5, 30, 0), (0, 0, 270))):
            Circle(SKETCH10_R)
        with Locations(Location((-32, 45.5, 0), (0, 0, 270))):
            Circle(SKETCH10_R_2)
    extrude(amount=-CUT_EXTRUDE5_DEPTH, mode=Mode.SUBTRACT)

    # Sketch11 → Cut-Extrude6 (cut, through all)
    with BuildSketch(Plane(origin=(0, 10, 0), x_dir=(1, 0, 0), z_dir=(0, 1, 0))):
        with Locations(Location((-44, -8, 0), (0, 0, 270))):
            Circle(SKETCH11_R)
        with Locations(Location((-15, -8, 0), (0, 0, 270))):
            Circle(SKETCH11_R)
    extrude(amount=-CUT_EXTRUDE6_DEPTH, mode=Mode.SUBTRACT)

    # Sketch12 → Cut-Extrude7 (cut, through all)
    with BuildSketch(Plane(origin=(0, 10, 0), x_dir=(1, 0, 0), z_dir=(0, 1, 0))):
        with Locations(Location((-24.5, -60, 0), (0, 0, 270))):
            Circle(SKETCH12_R)
        with Locations(Location((-15, -60, 0), (0, 0, 270))):
            Circle(SKETCH12_R)
    extrude(amount=-CUT_EXTRUDE7_DEPTH, mode=Mode.SUBTRACT)

    # Sketch13 → Cut-Extrude8 (cut, up to next)
    with BuildSketch(Plane.XZ, mode=Mode.PRIVATE) as cut_extrude8_sk1:
        with Locations(Location((33, -9.5, 0), (0, 0, 270))):
            Circle(SKETCH13_R)
    cut_extrude8_tool1 = extrude(cut_extrude8_sk1.sketch, amount=-CUT_EXTRUDE8_REACH, mode=Mode.PRIVATE) & part.part
    # Sketch13 → Cut-Extrude8 (cut, up to next)
    with BuildSketch(Plane.XZ, mode=Mode.PRIVATE) as cut_extrude8_sk2:
        with Locations(Location((33, 0, 0), (0, 0, 270))):
            Circle(SKETCH13_R)
    cut_extrude8_tool2 = extrude(cut_extrude8_sk2.sketch, amount=-CUT_EXTRUDE8_REACH, mode=Mode.PRIVATE) & part.part
    add(cut_extrude8_tool1.solids().sort_by_distance((33, 0, -9.5))[0], mode=Mode.SUBTRACT)
    add(cut_extrude8_tool2.solids().sort_by_distance((33, 0, 0))[0], mode=Mode.SUBTRACT)


solid = part.part
